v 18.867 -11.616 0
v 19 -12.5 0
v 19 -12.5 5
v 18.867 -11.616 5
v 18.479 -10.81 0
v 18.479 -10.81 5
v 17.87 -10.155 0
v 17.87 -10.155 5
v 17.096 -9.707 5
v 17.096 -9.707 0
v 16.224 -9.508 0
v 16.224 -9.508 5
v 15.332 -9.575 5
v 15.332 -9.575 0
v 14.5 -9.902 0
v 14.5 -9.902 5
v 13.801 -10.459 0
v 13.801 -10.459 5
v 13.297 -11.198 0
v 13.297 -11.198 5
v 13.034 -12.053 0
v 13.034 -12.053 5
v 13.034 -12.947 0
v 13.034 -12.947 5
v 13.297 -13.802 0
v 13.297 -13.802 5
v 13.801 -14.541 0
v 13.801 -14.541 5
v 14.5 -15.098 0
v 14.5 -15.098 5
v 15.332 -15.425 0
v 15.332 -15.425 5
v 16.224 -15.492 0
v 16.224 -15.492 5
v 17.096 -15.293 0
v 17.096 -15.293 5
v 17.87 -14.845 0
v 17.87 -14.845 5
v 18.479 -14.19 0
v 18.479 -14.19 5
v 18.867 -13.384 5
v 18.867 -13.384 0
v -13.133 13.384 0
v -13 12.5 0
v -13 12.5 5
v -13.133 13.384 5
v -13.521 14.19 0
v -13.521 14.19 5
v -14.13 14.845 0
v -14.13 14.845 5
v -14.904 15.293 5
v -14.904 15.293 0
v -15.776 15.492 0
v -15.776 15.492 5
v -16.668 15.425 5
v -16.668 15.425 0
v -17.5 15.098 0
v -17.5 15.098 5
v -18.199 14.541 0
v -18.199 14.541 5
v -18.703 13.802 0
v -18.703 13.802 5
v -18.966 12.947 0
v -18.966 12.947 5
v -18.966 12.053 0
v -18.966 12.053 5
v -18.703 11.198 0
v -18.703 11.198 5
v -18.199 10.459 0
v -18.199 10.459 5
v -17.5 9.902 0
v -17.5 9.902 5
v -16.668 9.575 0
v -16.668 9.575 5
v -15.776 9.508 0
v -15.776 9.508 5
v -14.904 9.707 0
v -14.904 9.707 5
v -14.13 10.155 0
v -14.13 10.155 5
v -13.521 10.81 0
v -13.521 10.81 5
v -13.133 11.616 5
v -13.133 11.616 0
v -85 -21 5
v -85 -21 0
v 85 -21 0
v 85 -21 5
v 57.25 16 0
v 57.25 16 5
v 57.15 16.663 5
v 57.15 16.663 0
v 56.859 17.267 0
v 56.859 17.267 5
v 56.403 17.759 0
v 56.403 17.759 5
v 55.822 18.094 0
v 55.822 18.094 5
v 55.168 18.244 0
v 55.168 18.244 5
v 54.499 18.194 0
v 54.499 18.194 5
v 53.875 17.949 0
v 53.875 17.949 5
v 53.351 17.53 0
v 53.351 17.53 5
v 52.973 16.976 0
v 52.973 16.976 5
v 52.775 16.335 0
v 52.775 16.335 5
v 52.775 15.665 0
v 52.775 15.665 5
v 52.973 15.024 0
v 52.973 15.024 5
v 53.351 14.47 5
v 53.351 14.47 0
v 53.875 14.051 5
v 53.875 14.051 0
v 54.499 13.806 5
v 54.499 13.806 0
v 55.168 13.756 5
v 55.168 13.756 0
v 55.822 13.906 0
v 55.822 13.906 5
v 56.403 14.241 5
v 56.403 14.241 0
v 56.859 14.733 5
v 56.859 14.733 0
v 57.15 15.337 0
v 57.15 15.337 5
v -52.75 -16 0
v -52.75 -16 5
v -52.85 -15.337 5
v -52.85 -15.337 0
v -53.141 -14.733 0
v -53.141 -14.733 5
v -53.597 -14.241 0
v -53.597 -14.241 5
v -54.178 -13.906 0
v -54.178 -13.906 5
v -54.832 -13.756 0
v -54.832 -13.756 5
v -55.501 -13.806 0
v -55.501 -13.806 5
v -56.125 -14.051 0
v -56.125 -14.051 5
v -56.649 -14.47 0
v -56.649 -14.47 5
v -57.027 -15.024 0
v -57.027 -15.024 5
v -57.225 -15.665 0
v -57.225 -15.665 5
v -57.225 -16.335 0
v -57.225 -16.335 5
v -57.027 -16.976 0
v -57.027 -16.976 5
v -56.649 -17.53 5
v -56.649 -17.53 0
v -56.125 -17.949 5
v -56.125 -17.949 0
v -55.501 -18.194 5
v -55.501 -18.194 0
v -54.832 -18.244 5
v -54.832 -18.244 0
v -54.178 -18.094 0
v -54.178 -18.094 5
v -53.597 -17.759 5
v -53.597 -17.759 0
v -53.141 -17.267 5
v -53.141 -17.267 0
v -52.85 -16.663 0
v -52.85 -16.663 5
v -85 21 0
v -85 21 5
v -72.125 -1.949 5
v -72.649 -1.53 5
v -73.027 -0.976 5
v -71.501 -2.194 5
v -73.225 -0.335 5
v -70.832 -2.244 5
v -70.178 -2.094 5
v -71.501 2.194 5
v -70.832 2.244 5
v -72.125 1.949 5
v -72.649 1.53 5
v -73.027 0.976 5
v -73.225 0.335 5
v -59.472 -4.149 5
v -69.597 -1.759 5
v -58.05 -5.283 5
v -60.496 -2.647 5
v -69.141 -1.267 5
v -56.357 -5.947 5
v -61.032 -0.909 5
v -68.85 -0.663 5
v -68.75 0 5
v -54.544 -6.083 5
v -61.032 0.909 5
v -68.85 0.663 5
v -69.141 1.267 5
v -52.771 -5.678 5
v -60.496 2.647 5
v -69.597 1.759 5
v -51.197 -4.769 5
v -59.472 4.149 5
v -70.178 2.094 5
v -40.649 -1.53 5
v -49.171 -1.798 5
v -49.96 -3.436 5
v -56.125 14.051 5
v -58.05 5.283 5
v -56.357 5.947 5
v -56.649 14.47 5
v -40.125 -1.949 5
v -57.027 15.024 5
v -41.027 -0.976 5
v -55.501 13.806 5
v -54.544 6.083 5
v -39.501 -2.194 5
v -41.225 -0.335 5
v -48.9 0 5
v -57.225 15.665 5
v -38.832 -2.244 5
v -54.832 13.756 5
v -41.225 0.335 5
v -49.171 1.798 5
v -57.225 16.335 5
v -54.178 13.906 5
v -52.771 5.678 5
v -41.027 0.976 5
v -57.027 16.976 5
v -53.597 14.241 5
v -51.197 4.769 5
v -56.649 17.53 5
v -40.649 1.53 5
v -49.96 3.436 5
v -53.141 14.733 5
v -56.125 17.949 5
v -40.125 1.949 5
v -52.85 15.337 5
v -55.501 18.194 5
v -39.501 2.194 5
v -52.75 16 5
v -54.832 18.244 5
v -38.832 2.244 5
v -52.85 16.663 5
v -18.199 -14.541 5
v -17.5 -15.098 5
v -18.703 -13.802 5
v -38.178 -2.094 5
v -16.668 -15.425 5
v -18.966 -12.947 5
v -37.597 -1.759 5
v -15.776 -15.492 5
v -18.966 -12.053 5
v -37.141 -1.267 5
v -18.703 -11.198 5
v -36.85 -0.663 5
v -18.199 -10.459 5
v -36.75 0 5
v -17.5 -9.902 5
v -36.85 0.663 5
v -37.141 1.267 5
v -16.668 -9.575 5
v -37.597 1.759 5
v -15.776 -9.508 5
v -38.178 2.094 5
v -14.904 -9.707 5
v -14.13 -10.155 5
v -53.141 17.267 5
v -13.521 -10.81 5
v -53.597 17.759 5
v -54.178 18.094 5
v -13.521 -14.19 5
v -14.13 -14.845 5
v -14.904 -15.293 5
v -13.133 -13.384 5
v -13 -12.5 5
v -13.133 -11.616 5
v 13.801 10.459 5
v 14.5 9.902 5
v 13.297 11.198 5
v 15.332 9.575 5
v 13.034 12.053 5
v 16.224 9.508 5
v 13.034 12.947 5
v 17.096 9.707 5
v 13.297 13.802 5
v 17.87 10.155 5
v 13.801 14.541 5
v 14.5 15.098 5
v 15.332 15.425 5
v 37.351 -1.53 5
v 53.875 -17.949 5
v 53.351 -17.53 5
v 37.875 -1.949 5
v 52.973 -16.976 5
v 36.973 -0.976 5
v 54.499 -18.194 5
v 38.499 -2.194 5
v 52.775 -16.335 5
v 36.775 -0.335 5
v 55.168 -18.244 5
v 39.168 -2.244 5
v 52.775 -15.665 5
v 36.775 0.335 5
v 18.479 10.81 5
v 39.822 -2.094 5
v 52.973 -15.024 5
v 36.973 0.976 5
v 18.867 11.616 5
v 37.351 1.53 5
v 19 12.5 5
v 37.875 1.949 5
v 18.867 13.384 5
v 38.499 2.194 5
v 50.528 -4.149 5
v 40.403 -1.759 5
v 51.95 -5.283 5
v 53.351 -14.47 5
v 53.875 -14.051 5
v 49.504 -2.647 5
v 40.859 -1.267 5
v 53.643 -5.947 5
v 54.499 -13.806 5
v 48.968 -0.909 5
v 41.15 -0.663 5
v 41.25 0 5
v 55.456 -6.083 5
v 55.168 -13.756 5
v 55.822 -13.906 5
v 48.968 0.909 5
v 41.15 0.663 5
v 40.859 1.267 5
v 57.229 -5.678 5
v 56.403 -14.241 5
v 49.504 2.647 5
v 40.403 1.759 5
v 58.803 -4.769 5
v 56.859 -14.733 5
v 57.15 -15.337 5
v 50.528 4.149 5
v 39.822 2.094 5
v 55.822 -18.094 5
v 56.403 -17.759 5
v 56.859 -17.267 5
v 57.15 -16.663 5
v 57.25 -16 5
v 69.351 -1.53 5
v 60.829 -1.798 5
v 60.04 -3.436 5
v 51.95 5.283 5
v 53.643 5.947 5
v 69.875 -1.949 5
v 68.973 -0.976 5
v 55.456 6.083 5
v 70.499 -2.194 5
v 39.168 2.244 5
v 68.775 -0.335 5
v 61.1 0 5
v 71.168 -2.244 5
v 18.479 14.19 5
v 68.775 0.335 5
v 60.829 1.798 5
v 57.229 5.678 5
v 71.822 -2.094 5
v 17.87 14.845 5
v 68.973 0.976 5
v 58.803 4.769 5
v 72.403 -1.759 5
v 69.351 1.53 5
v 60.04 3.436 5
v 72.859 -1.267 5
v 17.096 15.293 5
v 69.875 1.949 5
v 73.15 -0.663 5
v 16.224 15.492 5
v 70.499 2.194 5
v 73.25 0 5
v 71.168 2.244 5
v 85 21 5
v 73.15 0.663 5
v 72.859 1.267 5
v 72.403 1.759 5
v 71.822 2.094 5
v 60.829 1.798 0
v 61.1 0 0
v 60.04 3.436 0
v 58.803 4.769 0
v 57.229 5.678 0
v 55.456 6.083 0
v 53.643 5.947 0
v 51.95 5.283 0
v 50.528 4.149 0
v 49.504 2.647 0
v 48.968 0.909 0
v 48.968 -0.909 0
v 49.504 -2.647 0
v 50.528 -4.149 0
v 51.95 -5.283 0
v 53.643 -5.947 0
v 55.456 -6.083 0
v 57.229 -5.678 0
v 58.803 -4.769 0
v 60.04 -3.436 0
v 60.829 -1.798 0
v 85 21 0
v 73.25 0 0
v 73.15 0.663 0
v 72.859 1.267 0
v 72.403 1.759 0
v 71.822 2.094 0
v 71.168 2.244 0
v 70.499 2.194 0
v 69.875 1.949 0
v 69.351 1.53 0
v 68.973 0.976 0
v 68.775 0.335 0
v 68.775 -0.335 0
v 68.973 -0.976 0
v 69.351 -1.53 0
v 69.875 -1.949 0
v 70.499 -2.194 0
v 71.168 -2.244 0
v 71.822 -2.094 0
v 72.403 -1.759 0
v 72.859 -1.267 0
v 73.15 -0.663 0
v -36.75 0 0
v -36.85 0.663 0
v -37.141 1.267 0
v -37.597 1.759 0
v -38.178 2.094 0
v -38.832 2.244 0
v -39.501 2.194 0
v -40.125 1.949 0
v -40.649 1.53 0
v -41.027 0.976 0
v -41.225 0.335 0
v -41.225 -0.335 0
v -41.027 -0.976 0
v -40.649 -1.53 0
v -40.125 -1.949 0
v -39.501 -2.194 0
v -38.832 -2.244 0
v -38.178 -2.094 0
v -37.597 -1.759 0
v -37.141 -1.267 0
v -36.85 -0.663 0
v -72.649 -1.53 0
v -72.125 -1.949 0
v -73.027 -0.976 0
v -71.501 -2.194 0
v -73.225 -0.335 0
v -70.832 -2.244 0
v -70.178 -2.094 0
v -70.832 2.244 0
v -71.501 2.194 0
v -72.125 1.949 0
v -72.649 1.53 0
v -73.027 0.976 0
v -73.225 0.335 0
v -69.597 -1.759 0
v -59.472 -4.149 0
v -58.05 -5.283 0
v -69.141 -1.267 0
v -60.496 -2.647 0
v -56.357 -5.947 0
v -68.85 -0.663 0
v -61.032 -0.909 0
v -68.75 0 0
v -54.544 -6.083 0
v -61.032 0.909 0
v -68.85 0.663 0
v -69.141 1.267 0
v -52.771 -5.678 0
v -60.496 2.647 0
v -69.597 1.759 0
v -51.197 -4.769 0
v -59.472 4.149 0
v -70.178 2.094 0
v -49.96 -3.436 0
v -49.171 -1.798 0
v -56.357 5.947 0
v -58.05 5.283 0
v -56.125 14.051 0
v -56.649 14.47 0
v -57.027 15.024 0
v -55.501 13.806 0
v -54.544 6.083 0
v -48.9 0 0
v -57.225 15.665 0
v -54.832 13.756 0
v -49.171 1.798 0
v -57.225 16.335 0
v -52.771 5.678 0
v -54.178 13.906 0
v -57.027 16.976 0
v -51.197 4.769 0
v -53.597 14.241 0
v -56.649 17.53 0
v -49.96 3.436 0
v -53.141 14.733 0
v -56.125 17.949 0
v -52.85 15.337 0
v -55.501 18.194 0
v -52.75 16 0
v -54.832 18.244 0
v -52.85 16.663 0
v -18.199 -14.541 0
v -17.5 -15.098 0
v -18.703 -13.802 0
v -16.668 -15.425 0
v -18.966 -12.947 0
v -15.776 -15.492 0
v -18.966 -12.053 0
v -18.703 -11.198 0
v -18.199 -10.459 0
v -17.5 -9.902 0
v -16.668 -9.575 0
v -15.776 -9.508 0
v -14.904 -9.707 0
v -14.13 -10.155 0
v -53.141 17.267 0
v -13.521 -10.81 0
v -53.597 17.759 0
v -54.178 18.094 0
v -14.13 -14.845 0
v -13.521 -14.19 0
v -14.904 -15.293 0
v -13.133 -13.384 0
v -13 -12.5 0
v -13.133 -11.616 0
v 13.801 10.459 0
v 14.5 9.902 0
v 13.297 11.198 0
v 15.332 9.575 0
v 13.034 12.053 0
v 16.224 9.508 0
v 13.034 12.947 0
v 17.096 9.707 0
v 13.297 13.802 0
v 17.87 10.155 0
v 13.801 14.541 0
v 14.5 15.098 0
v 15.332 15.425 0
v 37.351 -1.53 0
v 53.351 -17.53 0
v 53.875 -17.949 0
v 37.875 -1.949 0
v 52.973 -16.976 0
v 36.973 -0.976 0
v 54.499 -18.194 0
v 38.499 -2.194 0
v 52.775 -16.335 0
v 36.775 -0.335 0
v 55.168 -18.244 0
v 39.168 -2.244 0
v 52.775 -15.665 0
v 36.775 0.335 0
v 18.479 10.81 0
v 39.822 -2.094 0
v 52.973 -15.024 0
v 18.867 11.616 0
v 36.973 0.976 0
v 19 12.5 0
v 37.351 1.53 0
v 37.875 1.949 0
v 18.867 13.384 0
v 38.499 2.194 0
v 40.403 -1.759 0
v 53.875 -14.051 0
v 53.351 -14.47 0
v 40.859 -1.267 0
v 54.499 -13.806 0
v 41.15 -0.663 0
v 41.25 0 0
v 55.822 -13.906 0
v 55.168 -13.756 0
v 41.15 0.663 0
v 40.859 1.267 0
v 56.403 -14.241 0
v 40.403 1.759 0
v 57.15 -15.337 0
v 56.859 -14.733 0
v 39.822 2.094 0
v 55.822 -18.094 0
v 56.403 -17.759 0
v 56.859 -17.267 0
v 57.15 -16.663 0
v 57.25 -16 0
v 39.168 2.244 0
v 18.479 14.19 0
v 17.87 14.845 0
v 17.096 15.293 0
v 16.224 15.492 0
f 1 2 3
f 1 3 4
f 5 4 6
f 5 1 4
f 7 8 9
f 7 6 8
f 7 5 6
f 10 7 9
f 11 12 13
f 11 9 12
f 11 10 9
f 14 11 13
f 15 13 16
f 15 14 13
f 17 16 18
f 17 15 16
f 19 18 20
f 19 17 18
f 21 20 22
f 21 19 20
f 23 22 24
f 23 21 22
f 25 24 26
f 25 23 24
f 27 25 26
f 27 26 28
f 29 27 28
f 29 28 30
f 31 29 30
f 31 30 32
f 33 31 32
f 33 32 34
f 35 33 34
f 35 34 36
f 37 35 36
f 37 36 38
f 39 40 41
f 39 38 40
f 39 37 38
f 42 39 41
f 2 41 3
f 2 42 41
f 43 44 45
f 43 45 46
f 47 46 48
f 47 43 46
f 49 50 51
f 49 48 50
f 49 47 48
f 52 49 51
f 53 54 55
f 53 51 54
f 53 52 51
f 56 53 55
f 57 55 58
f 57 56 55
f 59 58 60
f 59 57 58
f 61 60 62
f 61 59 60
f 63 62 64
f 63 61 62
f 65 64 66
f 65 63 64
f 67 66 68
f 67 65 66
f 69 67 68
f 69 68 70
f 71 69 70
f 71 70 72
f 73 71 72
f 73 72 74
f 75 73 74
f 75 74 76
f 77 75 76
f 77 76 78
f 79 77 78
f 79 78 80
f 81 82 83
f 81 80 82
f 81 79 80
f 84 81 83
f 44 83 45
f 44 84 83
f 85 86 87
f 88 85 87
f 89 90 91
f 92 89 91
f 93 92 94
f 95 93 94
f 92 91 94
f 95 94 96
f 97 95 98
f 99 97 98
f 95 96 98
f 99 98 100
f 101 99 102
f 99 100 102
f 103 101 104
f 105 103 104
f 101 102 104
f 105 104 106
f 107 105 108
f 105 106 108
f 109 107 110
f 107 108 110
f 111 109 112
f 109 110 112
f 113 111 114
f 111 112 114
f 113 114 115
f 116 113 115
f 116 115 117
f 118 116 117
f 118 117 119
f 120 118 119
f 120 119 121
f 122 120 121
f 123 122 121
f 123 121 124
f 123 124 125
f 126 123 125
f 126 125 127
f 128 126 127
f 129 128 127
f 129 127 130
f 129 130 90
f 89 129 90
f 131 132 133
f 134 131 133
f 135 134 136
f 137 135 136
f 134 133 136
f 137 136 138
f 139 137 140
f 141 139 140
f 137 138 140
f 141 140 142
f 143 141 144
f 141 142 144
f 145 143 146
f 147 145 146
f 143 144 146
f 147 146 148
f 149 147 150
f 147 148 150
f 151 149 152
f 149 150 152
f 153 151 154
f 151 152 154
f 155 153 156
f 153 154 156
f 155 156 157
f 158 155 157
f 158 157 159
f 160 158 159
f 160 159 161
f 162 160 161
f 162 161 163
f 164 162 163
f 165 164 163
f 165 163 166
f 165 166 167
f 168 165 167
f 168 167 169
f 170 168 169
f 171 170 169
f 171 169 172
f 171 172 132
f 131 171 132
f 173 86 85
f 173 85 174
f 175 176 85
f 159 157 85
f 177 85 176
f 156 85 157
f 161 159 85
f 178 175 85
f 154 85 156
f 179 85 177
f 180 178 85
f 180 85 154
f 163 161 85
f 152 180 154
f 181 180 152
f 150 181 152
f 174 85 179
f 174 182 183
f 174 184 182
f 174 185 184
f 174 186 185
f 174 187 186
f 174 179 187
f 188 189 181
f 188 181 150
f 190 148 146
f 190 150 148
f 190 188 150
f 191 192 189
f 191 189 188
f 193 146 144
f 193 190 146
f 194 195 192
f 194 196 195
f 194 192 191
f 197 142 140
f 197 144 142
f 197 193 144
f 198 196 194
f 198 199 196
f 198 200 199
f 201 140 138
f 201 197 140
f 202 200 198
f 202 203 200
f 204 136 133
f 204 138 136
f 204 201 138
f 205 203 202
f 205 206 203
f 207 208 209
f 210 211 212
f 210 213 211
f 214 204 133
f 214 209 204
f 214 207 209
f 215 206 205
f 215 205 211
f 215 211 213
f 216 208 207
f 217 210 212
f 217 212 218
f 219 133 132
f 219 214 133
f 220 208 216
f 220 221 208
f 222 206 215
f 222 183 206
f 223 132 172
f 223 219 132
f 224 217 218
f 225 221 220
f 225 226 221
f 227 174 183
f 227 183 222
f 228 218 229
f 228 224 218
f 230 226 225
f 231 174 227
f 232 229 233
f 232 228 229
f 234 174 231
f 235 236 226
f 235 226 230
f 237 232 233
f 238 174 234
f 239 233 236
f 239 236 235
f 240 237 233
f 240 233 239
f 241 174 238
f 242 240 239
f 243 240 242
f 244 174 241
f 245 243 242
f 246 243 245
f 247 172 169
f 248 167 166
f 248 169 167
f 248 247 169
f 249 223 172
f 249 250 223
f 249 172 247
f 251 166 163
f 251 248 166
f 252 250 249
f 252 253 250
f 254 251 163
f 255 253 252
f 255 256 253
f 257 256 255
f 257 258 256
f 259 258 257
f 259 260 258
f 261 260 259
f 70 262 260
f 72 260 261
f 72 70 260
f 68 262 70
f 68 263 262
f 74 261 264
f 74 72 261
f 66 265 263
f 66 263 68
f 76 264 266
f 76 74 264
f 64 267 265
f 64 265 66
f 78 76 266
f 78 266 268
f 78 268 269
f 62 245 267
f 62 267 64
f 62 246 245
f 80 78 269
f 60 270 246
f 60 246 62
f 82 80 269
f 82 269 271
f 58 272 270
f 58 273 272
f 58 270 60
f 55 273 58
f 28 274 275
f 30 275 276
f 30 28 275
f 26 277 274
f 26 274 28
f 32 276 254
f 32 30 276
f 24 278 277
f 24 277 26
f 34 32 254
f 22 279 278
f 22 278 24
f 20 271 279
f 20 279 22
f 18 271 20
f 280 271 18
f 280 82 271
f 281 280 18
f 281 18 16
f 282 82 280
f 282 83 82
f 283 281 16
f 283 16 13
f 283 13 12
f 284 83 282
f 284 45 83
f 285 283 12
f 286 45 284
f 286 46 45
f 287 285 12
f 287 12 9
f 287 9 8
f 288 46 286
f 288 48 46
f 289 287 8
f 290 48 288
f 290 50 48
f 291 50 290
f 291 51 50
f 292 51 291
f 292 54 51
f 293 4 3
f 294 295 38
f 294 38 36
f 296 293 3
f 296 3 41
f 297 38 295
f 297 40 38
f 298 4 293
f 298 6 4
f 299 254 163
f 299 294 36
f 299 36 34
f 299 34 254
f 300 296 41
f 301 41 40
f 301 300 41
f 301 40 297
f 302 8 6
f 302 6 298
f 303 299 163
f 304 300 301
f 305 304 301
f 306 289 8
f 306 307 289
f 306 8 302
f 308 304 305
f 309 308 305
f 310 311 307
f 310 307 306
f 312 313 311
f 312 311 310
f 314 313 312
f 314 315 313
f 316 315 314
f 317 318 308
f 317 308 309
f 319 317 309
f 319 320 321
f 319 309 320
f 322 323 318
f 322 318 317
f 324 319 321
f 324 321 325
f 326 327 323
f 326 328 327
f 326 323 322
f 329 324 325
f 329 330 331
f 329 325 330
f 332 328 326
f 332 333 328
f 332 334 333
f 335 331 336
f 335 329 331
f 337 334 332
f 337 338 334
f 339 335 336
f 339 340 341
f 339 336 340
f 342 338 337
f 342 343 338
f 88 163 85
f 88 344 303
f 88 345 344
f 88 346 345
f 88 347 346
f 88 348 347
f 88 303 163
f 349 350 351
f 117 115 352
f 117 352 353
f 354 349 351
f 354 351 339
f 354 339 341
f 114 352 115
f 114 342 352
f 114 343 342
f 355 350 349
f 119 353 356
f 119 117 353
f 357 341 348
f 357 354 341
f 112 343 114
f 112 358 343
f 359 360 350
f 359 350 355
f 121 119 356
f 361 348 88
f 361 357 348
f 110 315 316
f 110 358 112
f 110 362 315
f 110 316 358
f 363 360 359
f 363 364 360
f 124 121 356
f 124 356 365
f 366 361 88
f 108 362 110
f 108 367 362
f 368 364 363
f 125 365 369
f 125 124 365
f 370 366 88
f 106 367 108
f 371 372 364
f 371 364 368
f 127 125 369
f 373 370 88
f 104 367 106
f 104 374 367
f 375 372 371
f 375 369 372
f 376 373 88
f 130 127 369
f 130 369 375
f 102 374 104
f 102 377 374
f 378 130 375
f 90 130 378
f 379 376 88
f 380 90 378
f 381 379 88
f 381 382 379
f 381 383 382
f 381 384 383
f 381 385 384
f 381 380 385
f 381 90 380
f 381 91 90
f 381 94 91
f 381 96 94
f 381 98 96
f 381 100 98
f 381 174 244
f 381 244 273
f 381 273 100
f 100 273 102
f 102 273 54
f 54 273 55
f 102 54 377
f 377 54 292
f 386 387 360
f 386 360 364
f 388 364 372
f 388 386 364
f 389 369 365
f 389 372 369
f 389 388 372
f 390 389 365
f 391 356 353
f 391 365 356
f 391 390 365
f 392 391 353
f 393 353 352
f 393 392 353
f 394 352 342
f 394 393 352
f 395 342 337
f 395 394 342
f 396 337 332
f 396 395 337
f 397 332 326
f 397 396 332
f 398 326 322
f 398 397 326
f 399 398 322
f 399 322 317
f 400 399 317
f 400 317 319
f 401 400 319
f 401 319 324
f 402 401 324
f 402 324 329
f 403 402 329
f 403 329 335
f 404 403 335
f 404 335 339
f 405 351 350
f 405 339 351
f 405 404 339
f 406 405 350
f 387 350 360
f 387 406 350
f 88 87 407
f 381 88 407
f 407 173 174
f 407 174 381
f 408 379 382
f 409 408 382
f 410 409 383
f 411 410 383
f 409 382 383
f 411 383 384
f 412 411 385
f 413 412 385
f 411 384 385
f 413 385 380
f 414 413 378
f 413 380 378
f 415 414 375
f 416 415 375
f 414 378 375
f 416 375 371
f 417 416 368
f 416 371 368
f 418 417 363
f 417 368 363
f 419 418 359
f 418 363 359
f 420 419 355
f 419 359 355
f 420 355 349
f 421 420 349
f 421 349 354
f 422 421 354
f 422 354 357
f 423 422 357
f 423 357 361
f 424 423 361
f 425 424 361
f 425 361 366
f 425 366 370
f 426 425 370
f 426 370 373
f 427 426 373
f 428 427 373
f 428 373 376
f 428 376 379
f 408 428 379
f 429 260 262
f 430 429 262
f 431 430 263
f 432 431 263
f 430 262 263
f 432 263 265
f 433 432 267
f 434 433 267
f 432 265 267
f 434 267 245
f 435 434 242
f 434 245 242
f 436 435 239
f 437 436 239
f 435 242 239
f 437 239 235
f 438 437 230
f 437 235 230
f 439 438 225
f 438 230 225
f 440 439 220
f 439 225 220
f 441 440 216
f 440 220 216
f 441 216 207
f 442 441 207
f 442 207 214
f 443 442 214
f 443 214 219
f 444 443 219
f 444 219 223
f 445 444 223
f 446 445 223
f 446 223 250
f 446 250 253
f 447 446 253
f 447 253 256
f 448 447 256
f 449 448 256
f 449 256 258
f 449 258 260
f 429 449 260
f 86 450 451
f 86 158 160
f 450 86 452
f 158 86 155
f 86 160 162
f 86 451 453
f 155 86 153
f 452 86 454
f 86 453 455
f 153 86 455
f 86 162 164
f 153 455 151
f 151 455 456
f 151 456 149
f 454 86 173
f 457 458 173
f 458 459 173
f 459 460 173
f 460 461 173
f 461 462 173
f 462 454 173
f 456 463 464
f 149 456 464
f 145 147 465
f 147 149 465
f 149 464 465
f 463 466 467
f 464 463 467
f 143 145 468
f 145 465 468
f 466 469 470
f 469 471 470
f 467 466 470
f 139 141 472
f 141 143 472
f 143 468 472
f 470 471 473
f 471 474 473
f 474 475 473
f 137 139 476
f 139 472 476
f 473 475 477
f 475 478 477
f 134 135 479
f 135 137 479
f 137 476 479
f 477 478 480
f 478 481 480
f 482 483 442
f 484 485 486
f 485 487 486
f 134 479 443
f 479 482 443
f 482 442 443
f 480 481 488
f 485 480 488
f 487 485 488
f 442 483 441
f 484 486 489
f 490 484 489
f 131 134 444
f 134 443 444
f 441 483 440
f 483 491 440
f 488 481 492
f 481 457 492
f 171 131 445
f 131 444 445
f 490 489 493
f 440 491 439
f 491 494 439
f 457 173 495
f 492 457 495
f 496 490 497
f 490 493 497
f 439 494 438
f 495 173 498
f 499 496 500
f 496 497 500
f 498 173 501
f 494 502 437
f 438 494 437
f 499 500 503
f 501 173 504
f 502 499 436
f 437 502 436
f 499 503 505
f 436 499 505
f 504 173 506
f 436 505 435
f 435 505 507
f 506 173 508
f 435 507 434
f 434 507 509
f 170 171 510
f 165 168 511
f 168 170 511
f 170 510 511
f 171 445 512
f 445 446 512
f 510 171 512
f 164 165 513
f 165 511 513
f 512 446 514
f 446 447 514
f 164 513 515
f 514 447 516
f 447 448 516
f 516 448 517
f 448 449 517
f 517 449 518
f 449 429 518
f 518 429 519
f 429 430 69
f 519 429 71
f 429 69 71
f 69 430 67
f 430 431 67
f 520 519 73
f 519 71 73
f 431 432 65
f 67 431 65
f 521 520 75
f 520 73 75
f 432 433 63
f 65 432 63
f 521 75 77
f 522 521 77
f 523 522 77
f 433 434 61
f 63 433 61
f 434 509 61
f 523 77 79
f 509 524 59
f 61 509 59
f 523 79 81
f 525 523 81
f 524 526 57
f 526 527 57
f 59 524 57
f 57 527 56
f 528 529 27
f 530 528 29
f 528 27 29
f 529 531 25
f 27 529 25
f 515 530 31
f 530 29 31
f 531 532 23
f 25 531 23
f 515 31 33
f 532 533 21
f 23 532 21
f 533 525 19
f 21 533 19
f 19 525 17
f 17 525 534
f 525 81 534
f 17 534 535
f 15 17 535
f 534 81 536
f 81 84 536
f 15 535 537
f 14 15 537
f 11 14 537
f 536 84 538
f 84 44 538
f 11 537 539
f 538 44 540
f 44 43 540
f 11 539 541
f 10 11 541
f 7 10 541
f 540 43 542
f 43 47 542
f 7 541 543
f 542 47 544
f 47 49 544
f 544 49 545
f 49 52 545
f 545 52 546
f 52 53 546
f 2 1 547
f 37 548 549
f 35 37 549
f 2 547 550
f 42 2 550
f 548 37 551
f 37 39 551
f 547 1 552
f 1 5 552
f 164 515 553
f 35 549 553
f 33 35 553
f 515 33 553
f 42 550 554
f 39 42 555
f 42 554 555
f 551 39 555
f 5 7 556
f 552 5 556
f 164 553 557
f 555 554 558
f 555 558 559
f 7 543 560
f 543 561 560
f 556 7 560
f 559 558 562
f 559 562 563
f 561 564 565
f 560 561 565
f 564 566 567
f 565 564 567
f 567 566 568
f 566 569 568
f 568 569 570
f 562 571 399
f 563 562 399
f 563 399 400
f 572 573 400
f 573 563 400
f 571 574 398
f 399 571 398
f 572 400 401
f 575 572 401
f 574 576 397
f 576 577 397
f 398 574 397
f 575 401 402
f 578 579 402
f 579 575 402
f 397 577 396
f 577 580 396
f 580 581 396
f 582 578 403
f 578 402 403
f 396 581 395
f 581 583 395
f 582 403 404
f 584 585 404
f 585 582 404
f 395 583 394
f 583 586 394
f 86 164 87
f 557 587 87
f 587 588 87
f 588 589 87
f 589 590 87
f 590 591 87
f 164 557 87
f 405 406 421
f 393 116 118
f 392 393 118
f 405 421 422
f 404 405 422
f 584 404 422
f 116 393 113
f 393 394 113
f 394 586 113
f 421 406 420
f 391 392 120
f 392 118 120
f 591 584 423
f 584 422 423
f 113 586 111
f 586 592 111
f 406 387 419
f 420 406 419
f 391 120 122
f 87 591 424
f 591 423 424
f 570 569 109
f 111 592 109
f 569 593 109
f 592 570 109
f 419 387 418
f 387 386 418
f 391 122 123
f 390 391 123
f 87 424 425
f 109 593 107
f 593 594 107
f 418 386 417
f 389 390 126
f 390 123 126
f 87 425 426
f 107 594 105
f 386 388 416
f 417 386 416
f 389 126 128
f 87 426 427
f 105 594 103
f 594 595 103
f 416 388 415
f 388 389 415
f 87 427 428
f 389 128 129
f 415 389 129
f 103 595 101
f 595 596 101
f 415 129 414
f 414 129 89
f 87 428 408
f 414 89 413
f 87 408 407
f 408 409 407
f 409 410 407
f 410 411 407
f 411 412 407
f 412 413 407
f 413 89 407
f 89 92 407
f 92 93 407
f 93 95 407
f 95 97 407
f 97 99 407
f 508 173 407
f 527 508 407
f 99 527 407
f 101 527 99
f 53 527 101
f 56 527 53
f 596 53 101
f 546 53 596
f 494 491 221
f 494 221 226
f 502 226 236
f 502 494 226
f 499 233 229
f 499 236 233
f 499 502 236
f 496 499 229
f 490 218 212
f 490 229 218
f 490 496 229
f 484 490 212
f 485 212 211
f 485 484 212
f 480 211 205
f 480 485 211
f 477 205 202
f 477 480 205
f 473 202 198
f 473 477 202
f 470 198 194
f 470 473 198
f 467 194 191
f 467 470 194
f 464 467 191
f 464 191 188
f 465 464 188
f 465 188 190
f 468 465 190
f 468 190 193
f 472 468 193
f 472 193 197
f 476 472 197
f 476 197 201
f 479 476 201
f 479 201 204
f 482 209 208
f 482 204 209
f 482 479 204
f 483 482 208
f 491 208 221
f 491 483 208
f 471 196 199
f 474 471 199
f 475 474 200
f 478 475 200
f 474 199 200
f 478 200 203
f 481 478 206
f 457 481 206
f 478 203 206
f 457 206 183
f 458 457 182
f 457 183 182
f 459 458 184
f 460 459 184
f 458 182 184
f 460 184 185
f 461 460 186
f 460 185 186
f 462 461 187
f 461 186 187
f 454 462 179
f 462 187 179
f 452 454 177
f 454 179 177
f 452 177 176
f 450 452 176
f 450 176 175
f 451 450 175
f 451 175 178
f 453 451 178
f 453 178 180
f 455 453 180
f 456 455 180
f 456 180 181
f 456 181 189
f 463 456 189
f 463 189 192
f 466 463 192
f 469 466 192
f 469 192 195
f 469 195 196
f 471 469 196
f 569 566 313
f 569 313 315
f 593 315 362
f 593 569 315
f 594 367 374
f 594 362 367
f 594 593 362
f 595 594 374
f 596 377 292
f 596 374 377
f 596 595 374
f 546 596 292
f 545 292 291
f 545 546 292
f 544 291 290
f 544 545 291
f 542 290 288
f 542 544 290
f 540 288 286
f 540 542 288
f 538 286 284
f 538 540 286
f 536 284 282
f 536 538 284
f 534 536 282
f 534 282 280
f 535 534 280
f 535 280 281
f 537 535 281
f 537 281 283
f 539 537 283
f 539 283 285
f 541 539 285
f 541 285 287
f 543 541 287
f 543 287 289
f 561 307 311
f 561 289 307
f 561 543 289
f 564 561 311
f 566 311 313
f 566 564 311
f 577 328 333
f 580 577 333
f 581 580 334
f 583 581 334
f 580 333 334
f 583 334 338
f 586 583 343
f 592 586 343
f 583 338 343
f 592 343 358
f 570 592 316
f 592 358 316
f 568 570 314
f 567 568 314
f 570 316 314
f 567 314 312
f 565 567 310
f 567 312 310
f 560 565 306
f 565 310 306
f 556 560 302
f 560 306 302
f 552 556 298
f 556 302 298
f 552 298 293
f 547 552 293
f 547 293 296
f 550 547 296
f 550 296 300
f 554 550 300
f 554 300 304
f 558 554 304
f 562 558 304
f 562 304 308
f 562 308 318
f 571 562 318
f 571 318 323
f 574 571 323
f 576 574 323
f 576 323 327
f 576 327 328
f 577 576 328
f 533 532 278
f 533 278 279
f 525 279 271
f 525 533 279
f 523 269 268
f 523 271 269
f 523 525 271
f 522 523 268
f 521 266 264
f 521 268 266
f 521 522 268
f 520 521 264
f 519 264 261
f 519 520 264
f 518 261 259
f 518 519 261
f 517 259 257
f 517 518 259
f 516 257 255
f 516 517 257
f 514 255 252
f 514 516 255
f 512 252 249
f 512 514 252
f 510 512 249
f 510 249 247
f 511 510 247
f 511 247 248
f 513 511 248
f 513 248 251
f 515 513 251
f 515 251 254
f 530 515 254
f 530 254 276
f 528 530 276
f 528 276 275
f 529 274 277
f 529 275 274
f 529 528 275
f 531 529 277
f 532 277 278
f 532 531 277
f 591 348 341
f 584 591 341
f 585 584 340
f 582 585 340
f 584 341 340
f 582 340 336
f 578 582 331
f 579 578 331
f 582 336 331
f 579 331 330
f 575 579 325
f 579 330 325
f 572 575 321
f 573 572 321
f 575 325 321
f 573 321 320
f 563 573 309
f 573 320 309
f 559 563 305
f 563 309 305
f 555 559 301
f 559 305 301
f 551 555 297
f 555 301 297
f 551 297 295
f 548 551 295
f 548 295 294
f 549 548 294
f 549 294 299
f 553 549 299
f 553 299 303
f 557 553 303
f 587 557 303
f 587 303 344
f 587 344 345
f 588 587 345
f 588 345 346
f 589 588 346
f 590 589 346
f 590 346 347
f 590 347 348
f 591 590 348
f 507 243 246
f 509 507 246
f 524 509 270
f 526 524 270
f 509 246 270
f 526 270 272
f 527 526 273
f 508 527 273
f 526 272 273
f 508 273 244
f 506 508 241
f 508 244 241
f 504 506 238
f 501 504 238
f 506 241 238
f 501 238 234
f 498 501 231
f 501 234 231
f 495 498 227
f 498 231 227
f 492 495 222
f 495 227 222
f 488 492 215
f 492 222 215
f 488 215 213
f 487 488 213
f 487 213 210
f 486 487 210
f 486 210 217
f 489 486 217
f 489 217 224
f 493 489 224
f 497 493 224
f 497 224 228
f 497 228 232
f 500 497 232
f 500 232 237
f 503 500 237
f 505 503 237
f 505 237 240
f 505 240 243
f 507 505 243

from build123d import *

# Parameters (mm, degrees)
SKETCH1_W               = 170
SKETCH1_H               = 42
BOSS_EXTRUDE1_DEPTH     = 5
CUT_EXTRUDE1_DEPTH      = 88.698346621
CUT_EXTRUDE1_DEPTH_BACK = 88.698346621
SKETCH2_R               = 6.1
CUT_EXTRUDE2_DEPTH      = 88.698346621
CUT_EXTRUDE2_DEPTH_BACK = 88.698346621
SKETCH3_R               = 3
SKETCH4_R               = 2.25
CUT_EXTRUDE3_DEPTH      = 88.698346621


with BuildPart() as part:
    # Sketch1 → Boss-Extrude1 (new body)
    with BuildSketch(Plane.XY):
        Rectangle(SKETCH1_W, SKETCH1_H)
    extrude(amount=BOSS_EXTRUDE1_DEPTH)

    # Sketch2 → Cut-Extrude1 (cut, two sides: drawn at the far end of the back side and taken through both)
    with BuildSketch(Plane.XY.offset(5).offset(-CUT_EXTRUDE1_DEPTH_BACK)):
        with Locations((-55, 0)):
            Circle(SKETCH2_R)
        with Locations((55, 0)):
            Circle(SKETCH2_R)
    extrude(amount=CUT_EXTRUDE1_DEPTH + CUT_EXTRUDE1_DEPTH_BACK, mode=Mode.SUBTRACT)

    # Sketch3 → Cut-Extrude2 (cut, two sides: drawn at the far end of the back side and taken through both)
    with BuildSketch(Plane.XY.offset(5).offset(-CUT_EXTRUDE2_DEPTH_BACK)):
        with Locations((-16, -12.5)):
            Circle(SKETCH3_R)
        with Locations((-16, 12.5)):
            Circle(SKETCH3_R)
        with Locations((16, 12.5)):
            Circle(SKETCH3_R)
        with Locations((16, -12.5)):
            Circle(SKETCH3_R)
    extrude(amount=CUT_EXTRUDE2_DEPTH + CUT_EXTRUDE2_DEPTH_BACK, mode=Mode.SUBTRACT)

    # Sketch4 → Cut-Extrude3 (cut, through all)
    with BuildSketch(Plane.XY.offset(5)):
        with Locations((-71, 0)):
            Circle(SKETCH4_R)
        with Locations((-55, 16)):
            Circle(SKETCH4_R)
        with Locations((-39, 0)):
            Circle(SKETCH4_R)
        with Locations((-55, -16)):
            Circle(SKETCH4_R)
        with Locations((39, 0)):
            Circle(SKETCH4_R)
        with Locations((55, 16)):
            Circle(SKETCH4_R)
        with Locations((71, 0)):
            Circle(SKETCH4_R)
        with Locations((55, -16)):
            Circle(SKETCH4_R)
    extrude(amount=-CUT_EXTRUDE3_DEPTH, mode=Mode.SUBTRACT)


solid = part.part
